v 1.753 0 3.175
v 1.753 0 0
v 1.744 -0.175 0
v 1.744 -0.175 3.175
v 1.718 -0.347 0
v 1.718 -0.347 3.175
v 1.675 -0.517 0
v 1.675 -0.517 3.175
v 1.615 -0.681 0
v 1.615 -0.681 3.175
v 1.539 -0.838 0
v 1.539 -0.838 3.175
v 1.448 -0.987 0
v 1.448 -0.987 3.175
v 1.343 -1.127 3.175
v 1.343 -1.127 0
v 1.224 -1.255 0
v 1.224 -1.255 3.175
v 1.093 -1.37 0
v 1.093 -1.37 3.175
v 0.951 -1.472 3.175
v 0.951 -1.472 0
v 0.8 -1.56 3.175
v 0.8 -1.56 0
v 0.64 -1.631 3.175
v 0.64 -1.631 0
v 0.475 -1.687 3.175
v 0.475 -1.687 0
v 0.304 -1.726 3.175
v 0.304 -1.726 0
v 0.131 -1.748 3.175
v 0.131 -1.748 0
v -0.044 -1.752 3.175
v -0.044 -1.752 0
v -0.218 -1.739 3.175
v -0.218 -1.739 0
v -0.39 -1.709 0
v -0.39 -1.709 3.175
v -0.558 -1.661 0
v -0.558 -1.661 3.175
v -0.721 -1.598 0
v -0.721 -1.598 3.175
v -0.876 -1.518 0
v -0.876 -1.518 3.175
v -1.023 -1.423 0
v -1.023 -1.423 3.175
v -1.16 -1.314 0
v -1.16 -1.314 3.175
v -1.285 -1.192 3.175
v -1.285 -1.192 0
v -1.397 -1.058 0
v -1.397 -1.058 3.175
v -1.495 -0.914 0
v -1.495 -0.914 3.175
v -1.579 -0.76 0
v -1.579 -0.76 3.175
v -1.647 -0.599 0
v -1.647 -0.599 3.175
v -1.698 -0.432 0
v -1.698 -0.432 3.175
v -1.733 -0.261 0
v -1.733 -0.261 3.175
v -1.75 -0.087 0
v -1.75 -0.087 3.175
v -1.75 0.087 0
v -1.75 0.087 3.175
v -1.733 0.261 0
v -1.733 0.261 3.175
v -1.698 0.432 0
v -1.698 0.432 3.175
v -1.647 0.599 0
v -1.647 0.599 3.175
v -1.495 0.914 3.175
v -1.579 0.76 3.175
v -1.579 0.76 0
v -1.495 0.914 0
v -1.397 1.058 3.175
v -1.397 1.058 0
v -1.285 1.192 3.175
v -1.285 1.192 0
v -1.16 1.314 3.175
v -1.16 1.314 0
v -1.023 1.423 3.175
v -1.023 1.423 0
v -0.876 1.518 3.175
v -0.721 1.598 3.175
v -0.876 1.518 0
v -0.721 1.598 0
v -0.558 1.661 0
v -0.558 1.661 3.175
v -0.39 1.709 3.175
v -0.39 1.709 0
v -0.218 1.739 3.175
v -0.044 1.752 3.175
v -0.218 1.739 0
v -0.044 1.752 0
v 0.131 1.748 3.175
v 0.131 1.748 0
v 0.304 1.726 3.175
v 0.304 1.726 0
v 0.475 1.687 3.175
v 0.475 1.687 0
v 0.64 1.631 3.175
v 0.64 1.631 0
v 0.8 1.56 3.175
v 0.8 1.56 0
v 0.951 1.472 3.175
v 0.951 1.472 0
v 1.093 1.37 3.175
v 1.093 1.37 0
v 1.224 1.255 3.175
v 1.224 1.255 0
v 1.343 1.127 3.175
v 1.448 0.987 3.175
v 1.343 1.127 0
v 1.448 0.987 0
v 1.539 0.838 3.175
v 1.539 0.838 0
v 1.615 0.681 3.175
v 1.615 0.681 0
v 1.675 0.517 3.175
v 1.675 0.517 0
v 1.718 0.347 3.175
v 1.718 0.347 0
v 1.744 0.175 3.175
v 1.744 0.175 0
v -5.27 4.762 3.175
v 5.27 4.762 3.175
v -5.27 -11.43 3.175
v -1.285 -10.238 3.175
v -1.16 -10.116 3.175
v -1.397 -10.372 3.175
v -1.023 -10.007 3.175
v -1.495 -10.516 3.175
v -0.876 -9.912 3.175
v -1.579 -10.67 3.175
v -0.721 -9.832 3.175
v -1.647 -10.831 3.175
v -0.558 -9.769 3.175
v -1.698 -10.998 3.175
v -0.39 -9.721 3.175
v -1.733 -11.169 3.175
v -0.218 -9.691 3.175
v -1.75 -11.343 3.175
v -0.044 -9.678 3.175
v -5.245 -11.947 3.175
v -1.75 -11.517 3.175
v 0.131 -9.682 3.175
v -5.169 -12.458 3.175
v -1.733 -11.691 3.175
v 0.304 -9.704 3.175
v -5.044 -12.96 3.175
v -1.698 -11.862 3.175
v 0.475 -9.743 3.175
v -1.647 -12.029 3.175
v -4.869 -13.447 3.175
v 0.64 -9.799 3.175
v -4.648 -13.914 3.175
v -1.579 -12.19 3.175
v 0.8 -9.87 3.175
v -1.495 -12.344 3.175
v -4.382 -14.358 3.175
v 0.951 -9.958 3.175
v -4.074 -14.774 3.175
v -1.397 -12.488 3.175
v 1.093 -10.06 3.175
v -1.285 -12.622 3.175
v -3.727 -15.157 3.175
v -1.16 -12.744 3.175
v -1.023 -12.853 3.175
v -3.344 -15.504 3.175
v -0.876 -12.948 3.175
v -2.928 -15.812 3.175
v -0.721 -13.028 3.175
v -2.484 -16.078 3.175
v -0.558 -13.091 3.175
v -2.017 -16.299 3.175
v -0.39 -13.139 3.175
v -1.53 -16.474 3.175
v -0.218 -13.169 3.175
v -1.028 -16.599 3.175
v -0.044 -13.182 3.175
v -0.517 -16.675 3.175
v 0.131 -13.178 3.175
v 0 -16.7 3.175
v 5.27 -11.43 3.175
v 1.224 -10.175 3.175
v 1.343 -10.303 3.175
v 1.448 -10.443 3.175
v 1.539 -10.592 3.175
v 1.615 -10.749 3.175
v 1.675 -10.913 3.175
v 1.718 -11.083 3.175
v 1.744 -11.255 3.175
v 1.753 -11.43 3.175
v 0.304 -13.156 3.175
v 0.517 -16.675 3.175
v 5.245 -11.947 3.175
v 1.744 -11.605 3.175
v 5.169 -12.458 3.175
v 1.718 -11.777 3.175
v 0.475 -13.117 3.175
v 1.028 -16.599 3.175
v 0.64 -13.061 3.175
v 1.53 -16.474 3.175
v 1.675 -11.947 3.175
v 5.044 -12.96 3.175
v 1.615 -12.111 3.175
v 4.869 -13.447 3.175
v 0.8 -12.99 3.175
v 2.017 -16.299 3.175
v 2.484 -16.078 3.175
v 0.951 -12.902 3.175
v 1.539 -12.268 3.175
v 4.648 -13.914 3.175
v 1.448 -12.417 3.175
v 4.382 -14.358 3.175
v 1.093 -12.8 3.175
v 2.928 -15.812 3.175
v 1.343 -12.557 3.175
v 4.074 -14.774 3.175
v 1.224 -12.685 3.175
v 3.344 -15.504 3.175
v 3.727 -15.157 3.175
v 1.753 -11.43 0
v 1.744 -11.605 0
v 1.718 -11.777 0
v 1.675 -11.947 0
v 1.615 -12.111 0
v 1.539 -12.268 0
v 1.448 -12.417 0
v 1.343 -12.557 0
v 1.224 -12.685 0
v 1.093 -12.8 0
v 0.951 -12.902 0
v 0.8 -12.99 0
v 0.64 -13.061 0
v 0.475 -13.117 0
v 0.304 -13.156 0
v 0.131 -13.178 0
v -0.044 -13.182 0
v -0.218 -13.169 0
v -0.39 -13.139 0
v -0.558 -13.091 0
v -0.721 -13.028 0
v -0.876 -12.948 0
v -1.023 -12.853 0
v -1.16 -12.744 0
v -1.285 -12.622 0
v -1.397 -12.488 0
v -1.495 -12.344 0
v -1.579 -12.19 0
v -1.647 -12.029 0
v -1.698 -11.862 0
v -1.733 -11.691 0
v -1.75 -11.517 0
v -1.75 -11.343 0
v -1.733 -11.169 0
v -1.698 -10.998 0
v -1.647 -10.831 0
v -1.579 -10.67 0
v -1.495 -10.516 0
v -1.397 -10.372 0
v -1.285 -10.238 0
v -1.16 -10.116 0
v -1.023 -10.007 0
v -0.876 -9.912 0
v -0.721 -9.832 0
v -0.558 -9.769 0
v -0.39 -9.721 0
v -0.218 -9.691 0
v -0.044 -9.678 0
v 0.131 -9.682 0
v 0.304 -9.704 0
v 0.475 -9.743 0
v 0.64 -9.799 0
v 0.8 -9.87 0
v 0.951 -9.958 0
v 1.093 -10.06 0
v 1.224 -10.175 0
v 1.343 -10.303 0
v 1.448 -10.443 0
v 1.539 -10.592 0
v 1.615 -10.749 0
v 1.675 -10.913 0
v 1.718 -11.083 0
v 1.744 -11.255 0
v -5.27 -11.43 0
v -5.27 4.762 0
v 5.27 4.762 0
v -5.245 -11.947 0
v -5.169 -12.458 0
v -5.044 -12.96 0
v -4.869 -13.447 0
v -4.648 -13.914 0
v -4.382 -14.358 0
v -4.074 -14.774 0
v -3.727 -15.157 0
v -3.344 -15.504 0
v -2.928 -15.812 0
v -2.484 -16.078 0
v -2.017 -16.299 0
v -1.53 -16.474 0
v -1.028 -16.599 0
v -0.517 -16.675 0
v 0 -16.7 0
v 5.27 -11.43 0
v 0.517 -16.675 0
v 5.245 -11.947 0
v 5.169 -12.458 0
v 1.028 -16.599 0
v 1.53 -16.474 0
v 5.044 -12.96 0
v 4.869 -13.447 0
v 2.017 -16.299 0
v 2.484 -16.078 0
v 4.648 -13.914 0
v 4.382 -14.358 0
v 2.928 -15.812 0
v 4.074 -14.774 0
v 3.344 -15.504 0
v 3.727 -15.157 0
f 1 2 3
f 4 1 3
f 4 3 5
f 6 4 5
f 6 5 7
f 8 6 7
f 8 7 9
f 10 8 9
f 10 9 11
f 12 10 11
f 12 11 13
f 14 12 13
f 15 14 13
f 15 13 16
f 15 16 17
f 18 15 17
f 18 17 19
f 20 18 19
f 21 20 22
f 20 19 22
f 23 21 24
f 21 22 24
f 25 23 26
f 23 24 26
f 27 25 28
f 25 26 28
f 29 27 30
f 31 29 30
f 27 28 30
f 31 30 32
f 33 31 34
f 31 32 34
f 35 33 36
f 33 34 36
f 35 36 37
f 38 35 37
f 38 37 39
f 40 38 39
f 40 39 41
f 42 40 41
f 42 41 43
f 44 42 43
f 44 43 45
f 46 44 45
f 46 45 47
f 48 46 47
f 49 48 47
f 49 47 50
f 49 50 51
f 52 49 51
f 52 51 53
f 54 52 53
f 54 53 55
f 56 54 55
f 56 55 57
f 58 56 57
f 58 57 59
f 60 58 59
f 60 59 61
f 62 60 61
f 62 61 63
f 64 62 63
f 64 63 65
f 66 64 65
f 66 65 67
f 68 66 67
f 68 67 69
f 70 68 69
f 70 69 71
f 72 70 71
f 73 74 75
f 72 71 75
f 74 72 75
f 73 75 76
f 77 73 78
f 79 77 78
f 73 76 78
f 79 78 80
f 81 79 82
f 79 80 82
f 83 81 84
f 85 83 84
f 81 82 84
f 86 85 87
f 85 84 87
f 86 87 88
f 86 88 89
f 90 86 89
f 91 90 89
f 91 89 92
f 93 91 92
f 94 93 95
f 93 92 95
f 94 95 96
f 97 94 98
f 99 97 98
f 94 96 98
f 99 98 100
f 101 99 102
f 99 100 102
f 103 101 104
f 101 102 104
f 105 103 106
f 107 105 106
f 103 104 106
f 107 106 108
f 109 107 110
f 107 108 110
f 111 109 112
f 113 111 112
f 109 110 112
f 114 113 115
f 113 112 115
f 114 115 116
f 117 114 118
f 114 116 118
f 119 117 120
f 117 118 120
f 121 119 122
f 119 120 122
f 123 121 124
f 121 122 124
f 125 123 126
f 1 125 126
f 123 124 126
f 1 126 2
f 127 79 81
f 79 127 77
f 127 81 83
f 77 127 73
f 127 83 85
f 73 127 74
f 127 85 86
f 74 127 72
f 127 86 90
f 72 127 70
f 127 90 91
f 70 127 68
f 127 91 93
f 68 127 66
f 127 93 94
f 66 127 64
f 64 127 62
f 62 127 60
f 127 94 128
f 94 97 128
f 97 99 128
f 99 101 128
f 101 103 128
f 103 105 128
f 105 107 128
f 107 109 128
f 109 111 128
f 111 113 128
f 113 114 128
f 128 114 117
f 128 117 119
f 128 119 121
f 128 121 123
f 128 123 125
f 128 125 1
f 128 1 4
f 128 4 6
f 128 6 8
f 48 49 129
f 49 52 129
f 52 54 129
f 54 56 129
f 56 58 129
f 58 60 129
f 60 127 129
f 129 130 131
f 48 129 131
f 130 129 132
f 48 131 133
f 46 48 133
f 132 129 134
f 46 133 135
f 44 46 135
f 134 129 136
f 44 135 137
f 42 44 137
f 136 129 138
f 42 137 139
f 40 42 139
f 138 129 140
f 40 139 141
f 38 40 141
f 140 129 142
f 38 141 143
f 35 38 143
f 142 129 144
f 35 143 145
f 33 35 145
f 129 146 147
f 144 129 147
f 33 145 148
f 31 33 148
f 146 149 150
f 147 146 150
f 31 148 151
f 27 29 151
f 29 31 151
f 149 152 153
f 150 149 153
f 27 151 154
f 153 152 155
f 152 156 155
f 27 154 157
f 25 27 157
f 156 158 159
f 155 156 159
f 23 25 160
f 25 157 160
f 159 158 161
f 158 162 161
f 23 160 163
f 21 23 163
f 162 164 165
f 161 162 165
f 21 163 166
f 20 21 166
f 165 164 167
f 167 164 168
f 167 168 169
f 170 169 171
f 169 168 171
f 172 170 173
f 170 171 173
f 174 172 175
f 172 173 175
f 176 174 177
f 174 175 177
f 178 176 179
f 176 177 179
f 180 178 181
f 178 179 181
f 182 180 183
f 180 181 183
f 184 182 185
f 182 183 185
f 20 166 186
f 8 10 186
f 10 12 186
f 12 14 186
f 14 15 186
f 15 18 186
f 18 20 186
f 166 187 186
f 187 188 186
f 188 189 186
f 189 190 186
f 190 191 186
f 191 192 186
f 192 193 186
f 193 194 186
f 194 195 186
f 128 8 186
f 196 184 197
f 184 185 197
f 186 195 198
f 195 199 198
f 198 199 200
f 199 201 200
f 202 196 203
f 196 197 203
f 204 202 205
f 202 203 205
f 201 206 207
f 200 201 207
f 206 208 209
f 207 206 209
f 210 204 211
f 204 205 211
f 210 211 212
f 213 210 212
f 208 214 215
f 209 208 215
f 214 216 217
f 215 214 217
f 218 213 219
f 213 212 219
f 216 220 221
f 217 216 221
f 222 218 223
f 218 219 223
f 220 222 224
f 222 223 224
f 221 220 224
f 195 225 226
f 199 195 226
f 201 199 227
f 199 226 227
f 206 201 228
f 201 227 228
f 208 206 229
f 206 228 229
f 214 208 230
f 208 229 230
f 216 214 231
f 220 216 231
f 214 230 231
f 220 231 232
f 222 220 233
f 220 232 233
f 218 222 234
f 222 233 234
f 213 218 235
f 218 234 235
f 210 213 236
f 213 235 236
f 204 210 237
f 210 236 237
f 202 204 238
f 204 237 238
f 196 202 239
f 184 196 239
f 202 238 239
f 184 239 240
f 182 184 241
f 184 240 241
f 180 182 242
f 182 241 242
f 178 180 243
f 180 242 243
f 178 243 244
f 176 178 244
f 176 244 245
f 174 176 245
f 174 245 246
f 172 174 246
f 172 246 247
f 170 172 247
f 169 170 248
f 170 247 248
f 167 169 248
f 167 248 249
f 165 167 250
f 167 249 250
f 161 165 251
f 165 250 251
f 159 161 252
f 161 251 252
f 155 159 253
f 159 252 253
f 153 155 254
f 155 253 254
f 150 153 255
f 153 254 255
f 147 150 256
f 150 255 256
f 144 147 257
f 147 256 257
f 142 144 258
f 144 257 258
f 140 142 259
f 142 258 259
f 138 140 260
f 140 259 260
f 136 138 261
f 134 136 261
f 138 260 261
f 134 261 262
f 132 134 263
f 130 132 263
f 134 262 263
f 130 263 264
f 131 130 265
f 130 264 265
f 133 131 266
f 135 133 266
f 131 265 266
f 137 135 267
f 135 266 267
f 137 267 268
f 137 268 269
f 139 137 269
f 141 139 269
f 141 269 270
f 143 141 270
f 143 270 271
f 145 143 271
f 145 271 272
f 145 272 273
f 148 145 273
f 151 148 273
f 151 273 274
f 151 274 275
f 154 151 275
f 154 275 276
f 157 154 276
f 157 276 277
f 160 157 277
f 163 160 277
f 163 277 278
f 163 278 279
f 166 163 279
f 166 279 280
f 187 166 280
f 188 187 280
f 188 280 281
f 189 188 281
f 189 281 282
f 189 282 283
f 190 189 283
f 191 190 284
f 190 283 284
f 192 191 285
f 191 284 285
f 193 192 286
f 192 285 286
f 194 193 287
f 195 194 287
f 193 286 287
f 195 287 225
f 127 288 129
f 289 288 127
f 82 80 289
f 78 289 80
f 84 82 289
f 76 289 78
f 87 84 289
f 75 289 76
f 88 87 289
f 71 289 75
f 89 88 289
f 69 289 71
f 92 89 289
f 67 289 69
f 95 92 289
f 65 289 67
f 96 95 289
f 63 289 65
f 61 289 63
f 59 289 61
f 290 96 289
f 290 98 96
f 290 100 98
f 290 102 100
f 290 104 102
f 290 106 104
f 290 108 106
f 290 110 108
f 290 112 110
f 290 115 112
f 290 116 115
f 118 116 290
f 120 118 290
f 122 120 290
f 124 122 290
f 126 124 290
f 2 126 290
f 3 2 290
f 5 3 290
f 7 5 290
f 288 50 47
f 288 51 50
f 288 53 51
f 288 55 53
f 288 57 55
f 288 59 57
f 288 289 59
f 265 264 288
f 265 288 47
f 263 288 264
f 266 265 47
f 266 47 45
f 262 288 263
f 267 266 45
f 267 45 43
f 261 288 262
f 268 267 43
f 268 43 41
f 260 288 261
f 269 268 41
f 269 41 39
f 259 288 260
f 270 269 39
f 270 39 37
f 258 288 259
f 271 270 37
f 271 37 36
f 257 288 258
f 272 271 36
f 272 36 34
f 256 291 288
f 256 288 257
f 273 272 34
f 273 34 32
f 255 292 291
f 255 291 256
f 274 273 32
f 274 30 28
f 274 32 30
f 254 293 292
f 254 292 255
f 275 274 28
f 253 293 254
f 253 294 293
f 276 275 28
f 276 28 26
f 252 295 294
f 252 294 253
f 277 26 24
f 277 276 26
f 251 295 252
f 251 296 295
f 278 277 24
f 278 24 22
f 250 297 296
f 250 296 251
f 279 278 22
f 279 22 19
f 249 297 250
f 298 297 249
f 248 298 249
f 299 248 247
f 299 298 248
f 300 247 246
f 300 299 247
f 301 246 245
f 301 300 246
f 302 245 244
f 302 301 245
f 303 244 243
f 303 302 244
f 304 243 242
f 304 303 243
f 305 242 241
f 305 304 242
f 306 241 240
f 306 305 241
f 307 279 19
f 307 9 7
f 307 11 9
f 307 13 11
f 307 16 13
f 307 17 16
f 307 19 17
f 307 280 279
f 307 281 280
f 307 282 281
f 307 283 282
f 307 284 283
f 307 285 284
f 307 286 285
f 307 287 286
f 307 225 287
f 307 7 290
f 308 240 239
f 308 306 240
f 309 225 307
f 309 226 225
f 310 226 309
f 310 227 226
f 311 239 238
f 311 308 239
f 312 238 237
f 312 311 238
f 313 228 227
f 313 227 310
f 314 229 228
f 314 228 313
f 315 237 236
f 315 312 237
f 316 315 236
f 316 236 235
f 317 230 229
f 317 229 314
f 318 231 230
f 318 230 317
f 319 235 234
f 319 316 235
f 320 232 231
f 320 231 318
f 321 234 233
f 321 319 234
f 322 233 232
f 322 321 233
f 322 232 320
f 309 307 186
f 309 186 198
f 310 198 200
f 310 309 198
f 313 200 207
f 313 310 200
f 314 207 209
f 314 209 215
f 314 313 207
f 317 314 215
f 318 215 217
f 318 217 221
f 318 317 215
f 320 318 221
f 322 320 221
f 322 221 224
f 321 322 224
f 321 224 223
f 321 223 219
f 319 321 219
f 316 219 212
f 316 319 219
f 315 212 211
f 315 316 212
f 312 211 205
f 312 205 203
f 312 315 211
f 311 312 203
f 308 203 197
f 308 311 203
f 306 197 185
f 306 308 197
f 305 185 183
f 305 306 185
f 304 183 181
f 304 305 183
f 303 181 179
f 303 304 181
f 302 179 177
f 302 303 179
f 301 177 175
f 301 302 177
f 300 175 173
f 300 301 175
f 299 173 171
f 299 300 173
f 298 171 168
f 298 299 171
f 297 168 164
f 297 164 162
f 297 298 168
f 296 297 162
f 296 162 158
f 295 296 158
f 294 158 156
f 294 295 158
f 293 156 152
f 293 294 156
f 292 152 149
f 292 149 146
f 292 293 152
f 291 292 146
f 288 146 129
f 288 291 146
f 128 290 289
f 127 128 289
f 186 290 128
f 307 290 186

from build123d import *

# Parameters (mm, degrees)
F1_DEPTH = 3.175
F2_R     = 1.7526
F3_DEPTH = 3.175
F4_R     = 1.7526
F5_DEPTH = 25.4
F6_W     = 5.842
F6_H     = 6.35
F7_DEPTH = 25.4


with BuildPart() as f1:
    # F0 (on Top) → F1 (new body)
    with BuildSketch(Plane.XY):
        Polygon((-5.2705, 3.175), (-11.1125, 3.175), (-11.1125, -3.175), (-5.2705, -3.175), (-5.2705, -4.7625), (5.2705, -4.7625), (5.2705, -3.175), (11.1125, -3.175), (11.1125, 3.175), (5.2705, 3.175), (5.2705, 4.7625), (-5.2705, 4.7625), align=None)
    extrude(amount=F1_DEPTH)

    # F2 (on face) → F3 (join, through all)
    with BuildSketch(Plane(origin=(0, 0, 0), x_dir=(1, 0, 0), z_dir=(0, 0, -1))):
        with BuildLine():
            Line((5.2705, 4.7625), (5.2705, 11.43))
            ThreePointArc((5.2705, 11.43), (0, 16.7005), (-5.2705, 11.43))
            Line((-5.2705, 11.43), (-5.2705, 4.7625))
            Line((-5.2705, 4.7625), (5.2705, 4.7625))
        make_face()
        with Locations((0, 11.43)):
            Circle(F2_R, mode=Mode.SUBTRACT)
    extrude(amount=-F3_DEPTH)

    # F4 (on face) → F5 (cut)
    with BuildSketch(Plane(origin=(0, 0, 0), x_dir=(1, 0, 0), z_dir=(0, 0, -1))):
        Circle(F4_R)
    extrude(amount=-F5_DEPTH, mode=Mode.SUBTRACT)

    # F6 (on face) → F7 (cut)
    with BuildSketch(Plane.XY.offset(3.175)):
        with Locations((-8.1915, 0)):
            Rectangle(F6_W, F6_H)
        with Locations((8.1915, 0)):
            Rectangle(F6_W, F6_H)
    extrude(amount=-F7_DEPTH, mode=Mode.SUBTRACT)


solid = f1.part
